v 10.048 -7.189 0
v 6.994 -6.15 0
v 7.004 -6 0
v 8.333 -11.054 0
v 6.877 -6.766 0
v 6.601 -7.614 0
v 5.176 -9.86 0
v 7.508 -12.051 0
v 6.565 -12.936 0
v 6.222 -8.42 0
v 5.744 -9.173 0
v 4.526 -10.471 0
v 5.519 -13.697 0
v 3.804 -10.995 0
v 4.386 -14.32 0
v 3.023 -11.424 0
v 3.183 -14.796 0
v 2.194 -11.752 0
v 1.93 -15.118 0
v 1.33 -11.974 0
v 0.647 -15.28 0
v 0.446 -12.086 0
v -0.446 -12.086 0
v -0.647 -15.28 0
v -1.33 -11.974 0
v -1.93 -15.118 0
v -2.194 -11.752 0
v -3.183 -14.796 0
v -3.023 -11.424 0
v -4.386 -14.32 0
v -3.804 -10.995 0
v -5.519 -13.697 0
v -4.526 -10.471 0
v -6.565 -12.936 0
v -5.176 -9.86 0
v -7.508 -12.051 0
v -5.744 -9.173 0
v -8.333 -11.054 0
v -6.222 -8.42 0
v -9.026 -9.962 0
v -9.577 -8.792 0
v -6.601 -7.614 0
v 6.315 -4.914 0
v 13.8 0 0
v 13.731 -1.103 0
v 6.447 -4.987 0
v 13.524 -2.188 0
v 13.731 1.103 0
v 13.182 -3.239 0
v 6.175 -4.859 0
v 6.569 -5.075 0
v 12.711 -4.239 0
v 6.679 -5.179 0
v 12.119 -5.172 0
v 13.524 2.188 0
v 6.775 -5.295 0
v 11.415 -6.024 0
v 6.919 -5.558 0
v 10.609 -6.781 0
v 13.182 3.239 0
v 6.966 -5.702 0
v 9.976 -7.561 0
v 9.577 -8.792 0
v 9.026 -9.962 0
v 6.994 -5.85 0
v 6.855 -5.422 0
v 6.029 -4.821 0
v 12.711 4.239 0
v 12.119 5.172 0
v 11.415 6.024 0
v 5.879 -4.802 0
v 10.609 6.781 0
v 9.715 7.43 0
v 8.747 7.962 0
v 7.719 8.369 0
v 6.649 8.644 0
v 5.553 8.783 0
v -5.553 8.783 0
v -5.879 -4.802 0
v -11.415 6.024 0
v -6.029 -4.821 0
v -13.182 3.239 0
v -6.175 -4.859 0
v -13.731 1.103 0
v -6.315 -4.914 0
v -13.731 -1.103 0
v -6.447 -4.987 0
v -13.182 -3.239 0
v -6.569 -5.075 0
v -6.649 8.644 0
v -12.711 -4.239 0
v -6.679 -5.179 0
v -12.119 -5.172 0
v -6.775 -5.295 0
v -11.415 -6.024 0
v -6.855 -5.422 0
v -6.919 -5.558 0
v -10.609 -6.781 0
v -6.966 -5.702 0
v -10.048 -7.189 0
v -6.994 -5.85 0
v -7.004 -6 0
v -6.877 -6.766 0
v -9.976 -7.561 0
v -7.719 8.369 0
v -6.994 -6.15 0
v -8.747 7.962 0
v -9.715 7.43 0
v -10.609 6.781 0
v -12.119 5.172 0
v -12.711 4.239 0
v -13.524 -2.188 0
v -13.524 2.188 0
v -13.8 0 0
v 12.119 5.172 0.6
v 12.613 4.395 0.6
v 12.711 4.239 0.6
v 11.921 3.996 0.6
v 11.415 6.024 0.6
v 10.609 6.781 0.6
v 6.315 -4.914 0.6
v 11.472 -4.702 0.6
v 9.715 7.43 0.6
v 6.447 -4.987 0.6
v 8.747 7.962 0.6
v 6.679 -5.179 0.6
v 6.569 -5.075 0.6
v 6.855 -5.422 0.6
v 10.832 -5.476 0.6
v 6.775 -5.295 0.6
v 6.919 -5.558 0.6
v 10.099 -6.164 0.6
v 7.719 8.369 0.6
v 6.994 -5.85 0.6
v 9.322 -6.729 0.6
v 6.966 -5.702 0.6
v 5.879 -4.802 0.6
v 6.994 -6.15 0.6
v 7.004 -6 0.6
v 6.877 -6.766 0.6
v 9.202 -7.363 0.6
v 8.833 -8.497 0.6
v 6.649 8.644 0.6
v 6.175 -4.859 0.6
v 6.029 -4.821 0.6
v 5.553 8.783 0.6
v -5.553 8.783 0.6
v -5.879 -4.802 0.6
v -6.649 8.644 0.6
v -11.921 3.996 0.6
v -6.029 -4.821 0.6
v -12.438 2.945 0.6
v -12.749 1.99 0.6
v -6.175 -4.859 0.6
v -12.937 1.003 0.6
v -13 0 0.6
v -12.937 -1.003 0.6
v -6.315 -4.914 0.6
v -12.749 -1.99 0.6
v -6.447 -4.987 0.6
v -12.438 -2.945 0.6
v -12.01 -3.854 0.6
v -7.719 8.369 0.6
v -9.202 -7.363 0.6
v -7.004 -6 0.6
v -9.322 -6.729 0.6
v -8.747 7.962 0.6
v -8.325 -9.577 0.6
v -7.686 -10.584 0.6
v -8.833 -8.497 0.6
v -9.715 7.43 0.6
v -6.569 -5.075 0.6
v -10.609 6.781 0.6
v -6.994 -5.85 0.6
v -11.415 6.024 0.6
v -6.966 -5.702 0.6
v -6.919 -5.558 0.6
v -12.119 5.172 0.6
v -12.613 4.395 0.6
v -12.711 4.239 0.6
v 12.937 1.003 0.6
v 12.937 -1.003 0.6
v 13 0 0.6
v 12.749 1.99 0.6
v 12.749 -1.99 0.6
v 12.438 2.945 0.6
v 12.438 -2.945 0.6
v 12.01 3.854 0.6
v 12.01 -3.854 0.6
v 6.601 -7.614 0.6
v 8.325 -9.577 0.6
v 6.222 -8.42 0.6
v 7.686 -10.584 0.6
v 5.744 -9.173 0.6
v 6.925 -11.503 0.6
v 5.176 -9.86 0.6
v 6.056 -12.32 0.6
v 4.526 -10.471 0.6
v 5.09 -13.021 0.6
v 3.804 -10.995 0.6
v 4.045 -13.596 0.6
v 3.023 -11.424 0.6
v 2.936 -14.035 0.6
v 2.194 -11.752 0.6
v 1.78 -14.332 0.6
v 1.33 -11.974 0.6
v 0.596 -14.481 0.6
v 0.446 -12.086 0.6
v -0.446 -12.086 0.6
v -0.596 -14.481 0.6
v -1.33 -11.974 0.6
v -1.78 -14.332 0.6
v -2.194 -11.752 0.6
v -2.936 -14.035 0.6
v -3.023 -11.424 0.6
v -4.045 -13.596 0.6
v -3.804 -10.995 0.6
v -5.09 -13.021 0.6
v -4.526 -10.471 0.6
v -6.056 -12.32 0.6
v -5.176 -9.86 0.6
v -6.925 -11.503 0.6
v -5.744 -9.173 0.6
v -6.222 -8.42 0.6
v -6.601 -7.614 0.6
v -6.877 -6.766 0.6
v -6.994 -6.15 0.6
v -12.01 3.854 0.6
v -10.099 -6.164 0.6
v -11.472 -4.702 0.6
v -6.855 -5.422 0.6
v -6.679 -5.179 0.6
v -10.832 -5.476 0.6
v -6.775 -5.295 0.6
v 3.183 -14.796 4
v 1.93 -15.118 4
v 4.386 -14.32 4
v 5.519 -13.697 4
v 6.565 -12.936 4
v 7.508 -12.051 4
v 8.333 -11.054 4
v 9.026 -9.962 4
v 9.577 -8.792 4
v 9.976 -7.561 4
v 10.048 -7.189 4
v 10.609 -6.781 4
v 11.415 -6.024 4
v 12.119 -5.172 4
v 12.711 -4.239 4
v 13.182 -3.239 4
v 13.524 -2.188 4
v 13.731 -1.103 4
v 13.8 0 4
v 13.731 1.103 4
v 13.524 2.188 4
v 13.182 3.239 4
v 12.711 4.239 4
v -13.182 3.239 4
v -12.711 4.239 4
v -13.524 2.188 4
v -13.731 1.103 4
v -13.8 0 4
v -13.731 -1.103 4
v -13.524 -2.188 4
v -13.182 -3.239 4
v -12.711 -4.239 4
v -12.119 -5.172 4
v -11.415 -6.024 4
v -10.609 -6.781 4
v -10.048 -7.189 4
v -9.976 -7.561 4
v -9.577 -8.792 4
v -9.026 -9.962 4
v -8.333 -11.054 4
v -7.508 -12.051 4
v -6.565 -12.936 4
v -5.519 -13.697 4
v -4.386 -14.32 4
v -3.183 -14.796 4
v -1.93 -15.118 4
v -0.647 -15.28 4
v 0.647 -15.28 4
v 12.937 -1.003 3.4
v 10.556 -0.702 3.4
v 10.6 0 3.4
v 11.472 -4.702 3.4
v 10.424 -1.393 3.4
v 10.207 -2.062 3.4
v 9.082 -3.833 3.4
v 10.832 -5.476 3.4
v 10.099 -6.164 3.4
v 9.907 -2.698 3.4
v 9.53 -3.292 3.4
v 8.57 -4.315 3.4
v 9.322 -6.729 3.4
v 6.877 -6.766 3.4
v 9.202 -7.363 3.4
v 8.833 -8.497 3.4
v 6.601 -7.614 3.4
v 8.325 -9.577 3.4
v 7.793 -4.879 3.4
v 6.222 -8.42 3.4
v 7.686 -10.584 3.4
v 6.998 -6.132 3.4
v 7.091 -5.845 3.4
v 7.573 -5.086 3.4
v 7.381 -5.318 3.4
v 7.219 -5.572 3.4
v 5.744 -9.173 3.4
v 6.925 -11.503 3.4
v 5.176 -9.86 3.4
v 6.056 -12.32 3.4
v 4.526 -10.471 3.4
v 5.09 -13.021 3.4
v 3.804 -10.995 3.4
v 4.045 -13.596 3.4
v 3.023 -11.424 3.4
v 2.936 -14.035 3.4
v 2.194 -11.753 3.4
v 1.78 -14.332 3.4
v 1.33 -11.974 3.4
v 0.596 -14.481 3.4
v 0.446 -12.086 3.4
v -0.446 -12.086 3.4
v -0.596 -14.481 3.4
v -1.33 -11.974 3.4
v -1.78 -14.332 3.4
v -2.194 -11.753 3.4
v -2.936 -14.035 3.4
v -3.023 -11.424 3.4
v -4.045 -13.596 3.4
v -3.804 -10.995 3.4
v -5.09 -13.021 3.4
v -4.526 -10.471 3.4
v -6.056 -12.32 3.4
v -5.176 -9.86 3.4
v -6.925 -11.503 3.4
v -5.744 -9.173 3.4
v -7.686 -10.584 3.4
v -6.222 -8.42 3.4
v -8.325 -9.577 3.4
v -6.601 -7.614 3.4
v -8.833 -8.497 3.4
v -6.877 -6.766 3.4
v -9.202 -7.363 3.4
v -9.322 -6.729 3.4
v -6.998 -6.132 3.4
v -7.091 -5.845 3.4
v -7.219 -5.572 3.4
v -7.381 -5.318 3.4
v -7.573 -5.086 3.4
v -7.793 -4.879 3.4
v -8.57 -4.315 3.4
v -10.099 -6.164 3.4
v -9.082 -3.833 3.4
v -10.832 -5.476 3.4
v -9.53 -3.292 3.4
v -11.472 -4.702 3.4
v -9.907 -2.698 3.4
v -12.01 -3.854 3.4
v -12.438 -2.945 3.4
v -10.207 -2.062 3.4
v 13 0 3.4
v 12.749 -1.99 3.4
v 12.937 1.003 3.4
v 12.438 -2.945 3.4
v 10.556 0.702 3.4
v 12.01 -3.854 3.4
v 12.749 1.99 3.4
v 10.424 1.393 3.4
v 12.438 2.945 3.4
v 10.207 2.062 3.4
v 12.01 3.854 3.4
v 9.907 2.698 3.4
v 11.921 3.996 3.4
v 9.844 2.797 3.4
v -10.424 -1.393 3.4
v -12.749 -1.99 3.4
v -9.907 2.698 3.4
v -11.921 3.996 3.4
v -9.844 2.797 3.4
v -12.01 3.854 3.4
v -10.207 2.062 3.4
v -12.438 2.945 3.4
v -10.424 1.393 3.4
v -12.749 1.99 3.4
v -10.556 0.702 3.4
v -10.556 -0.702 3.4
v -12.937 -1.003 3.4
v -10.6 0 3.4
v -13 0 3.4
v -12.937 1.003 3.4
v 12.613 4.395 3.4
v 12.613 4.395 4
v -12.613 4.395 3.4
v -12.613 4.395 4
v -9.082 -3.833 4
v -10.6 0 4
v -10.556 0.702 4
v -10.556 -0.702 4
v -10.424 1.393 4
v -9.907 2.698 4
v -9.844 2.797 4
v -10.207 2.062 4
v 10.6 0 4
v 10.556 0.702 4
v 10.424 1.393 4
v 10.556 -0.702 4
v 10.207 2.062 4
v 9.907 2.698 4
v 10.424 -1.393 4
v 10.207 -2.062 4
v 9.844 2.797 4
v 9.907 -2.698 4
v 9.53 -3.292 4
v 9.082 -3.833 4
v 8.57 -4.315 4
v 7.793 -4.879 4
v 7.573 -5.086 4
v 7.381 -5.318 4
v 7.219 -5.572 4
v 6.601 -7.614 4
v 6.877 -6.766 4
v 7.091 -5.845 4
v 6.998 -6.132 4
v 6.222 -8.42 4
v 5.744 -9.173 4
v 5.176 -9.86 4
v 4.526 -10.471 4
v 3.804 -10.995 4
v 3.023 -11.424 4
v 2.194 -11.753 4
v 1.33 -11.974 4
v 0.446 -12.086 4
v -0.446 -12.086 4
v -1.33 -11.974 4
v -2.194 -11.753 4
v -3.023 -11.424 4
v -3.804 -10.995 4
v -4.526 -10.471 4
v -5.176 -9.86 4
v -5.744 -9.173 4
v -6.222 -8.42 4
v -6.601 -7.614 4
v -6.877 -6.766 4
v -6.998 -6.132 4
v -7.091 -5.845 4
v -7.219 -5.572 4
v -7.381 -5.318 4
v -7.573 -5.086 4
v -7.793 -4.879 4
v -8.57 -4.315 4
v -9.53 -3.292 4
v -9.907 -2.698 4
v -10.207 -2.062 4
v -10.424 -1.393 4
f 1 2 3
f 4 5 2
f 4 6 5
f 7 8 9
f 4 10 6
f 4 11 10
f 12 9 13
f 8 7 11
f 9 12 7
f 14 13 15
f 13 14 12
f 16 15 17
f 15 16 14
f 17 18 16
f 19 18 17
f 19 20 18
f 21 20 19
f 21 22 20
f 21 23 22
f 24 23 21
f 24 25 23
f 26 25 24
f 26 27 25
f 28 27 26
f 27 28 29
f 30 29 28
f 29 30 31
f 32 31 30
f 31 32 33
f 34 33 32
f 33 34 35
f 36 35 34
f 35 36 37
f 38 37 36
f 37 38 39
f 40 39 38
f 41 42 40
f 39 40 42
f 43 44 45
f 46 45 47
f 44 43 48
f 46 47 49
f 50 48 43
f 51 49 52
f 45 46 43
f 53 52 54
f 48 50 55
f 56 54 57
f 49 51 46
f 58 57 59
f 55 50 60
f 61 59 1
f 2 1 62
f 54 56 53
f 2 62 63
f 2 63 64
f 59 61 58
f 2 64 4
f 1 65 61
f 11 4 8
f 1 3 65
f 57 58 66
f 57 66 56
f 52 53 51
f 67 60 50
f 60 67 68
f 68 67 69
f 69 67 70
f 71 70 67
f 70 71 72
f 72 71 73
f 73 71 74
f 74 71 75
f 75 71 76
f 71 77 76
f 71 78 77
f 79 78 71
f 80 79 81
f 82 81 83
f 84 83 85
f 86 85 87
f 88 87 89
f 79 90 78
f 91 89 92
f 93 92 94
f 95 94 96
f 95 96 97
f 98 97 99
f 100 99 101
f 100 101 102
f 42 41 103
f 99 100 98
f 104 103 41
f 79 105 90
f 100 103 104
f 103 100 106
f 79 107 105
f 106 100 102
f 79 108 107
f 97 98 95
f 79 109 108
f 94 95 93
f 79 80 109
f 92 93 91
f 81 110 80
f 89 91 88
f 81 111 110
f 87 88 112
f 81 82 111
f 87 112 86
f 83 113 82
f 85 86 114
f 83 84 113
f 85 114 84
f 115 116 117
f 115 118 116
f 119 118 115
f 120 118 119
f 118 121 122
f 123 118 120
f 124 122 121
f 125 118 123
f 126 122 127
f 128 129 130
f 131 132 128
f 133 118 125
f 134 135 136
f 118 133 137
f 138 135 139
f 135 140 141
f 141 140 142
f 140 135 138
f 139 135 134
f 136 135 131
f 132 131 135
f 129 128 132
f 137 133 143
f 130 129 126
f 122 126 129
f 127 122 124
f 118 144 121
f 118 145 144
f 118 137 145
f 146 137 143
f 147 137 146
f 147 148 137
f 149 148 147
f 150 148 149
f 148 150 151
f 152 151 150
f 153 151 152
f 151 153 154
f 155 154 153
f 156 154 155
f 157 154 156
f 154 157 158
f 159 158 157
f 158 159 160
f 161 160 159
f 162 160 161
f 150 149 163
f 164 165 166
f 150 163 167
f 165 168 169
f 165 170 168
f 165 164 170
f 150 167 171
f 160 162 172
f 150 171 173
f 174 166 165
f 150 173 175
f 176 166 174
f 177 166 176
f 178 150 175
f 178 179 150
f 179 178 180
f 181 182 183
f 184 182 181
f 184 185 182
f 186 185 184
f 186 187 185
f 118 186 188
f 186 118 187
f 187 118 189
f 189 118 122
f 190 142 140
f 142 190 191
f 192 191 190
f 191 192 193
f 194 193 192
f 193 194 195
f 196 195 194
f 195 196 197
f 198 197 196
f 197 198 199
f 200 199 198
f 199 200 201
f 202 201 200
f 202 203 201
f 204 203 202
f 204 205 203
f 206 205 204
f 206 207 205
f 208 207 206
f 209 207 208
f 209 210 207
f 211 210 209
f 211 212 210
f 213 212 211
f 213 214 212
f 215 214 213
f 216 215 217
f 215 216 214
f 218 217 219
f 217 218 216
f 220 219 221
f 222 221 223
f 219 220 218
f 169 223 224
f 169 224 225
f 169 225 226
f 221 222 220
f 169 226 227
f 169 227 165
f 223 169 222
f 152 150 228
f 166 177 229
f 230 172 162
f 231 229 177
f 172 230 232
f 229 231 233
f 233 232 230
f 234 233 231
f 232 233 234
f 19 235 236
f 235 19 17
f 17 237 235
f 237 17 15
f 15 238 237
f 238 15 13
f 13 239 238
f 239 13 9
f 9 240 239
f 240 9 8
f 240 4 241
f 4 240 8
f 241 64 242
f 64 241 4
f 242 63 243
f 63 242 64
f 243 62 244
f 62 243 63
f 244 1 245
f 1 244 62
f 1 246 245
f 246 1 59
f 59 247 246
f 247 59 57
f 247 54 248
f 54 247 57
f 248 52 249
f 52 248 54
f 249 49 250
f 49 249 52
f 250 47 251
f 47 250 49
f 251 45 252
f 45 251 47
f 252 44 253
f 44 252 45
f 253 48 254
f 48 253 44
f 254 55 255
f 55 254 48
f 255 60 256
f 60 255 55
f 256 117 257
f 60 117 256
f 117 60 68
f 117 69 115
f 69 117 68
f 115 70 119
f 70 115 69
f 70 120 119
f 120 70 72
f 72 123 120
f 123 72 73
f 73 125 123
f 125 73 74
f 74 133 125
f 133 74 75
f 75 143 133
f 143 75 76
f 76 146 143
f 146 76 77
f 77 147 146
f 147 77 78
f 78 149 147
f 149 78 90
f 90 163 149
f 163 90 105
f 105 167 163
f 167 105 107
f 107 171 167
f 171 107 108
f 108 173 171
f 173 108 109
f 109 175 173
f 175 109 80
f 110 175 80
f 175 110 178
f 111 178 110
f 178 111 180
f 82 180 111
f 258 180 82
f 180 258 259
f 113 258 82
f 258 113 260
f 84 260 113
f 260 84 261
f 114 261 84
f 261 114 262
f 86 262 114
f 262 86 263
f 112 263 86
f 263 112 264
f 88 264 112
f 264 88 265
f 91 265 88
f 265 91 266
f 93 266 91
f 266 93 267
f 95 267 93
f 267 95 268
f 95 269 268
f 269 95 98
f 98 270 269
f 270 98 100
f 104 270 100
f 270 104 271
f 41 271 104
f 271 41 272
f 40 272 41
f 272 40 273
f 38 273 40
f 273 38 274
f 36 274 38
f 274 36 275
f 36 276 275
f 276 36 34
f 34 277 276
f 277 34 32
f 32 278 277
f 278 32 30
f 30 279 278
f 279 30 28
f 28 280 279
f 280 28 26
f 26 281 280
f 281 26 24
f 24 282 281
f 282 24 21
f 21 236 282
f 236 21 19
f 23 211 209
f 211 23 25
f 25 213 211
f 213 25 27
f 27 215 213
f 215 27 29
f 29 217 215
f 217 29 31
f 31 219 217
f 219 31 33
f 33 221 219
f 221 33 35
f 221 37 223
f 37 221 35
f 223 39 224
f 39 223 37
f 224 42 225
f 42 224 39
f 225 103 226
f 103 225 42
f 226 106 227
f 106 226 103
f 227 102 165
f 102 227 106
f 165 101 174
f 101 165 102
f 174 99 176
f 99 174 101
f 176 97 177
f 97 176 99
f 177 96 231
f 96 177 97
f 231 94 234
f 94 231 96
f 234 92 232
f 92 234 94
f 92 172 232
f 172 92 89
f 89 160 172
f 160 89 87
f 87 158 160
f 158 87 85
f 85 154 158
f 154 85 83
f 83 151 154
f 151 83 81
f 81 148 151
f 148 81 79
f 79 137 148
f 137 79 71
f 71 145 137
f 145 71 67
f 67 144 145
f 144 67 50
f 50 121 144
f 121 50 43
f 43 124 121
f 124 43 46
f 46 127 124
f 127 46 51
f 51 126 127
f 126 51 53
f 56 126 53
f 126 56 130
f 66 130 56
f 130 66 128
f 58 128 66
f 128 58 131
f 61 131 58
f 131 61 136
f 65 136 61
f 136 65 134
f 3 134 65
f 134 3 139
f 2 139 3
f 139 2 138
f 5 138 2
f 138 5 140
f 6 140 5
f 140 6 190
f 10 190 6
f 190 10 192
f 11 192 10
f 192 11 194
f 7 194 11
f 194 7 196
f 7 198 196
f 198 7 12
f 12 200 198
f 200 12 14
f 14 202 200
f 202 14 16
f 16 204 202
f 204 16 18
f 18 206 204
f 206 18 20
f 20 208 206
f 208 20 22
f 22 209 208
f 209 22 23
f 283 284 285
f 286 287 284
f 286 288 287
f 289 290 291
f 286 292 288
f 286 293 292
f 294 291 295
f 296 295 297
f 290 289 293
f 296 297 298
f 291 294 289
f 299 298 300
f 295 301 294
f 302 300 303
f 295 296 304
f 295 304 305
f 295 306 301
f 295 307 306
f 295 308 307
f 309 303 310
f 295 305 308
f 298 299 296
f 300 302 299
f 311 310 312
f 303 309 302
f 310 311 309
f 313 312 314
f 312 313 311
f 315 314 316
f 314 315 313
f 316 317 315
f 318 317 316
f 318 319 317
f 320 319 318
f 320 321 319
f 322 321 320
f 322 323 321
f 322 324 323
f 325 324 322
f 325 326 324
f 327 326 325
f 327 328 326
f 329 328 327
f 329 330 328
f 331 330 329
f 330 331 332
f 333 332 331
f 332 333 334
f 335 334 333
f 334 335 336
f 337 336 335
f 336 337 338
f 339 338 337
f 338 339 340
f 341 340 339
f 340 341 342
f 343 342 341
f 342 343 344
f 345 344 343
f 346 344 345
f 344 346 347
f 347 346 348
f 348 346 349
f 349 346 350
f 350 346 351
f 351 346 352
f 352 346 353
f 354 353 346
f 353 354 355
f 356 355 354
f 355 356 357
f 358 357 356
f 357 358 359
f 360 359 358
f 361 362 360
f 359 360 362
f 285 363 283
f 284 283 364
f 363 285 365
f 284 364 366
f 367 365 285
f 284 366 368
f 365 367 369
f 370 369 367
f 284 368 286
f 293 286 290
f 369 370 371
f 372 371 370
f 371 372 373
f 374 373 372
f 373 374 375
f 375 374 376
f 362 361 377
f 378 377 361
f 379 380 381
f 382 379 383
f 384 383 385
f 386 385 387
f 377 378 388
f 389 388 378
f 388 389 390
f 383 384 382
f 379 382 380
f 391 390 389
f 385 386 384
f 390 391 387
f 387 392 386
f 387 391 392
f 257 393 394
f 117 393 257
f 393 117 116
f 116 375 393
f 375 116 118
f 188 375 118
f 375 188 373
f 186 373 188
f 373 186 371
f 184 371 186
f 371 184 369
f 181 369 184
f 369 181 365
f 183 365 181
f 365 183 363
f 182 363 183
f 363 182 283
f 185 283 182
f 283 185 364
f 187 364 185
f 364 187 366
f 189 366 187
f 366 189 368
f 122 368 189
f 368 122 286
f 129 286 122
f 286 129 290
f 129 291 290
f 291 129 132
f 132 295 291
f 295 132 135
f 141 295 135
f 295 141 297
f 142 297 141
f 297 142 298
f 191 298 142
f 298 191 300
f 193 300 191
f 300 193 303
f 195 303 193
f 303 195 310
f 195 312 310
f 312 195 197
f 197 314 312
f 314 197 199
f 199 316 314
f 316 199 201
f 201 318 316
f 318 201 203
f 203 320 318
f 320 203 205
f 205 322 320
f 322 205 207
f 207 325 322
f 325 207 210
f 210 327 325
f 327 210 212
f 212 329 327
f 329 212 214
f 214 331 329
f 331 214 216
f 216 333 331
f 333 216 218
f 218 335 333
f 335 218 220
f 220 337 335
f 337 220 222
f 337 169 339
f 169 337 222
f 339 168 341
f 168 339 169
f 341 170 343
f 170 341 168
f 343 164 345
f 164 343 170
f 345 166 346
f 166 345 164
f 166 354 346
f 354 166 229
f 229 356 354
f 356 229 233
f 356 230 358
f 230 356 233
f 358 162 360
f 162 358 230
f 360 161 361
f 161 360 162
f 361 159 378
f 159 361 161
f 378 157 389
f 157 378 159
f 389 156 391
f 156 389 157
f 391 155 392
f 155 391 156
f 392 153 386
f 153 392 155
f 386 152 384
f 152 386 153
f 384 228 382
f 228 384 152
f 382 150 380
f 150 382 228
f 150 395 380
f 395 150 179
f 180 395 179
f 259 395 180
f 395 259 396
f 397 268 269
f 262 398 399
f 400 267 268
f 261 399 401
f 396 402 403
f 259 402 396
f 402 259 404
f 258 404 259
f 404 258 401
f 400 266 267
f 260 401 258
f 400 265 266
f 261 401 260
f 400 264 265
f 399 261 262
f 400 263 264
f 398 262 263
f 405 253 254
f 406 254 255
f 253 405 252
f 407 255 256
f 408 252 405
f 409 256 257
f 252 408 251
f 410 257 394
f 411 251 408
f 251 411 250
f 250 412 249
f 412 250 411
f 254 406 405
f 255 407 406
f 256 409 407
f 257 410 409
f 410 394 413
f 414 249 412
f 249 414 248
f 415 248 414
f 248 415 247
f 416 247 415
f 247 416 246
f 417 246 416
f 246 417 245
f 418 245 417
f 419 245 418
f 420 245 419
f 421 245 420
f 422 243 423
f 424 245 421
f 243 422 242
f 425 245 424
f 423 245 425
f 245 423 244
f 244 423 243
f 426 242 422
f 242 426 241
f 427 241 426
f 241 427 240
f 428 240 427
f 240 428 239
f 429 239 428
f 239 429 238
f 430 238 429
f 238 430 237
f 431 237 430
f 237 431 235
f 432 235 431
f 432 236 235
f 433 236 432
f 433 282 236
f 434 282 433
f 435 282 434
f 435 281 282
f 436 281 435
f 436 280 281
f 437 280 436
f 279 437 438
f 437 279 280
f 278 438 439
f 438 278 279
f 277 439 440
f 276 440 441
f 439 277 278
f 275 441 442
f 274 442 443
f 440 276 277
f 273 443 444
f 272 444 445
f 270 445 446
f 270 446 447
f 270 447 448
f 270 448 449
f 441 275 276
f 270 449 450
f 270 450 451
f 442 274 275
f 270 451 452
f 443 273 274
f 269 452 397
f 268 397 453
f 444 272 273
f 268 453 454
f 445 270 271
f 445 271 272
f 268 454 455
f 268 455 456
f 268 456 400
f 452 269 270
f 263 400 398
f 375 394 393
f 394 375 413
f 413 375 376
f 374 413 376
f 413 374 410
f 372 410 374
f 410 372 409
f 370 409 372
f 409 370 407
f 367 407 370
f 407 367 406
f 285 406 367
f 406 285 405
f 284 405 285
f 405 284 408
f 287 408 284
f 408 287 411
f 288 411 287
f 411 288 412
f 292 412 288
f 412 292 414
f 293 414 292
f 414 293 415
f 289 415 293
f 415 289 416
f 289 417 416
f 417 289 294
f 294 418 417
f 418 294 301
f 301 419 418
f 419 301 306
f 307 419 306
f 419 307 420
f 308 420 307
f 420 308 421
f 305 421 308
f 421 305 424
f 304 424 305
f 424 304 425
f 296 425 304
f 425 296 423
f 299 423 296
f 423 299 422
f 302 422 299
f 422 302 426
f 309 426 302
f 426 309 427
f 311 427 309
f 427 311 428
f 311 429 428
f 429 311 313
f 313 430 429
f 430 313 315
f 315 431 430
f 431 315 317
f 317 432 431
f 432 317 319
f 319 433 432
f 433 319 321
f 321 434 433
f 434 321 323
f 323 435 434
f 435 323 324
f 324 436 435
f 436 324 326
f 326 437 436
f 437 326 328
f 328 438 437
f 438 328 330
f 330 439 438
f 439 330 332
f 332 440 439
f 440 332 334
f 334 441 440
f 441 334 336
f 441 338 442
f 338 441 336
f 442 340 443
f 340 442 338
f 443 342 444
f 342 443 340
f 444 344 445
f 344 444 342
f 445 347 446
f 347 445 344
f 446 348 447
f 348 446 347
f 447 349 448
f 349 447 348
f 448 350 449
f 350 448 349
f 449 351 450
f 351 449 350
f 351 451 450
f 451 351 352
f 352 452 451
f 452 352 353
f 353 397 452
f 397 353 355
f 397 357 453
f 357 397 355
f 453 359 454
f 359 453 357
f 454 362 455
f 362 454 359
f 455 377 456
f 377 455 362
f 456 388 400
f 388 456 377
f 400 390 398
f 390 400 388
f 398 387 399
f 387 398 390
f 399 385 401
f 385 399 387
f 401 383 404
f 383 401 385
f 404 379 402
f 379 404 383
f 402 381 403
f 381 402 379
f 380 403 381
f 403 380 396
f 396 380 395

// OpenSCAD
// file: ../lib/subtract.scad
// module subtr_2d(radius) {
//     render() difference() {
//         children();
//         minkowski() {
//             difference() {
//                 minkowski() {
//                     children();
//                     square(1, center = true);
//                 }
//                 children();
//             }
//             circle(radius);
//         }
//     }
// }

module subtr_2d(radius, bbox = 1000) {
    render() difference() {
        children();
        minkowski() {
            difference() {
                square(bbox, center = true);
                children();
            }
            circle(radius);
        }
    }
}

module subtr_3d(radius, bbox = 1000) {
    render() difference() {
        children();
        minkowski() {
            difference() {
                cube(bbox, center = true);
                children();
            }
            sphere(radius);
        }
    }
}
// main file
include <../lib/subtract.scad>
$fn = 50;

inset = 2.4;
r_mid = 19 / 2;
r_hole = r_mid - inset;
r_side = 16 / 2;
width = 26;
mid_shift = 5;
cutoff_inner = 4.5;
cutoff_angle = 30;
cutoff_hole = -6;
roundness = 1.2;

shell = 0.8;
height_inner = 2.8;
height_outer = 0.6;

module cutoff_square(cutoff) {
    translate([ -100, cutoff ]) square([ 200, 100 ]);
}

module radial_cutoff_half() {
    intersection() {
        translate([ width / 2 - r_side, 0 ]) rotate(cutoff_angle) cutoff_square(0);
        rotate(-90) cutoff_square(0);
    }
}

module radial_cutoff() {
    radial_cutoff_half();
    mirror([ 1, 0 ]) radial_cutoff_half();
}

module key() {
    translate([ 0, -mid_shift ]) circle(r_mid);
    hull() {
        translate([ width / 2 - r_side, 0 ]) circle(r_side);
        translate([ -(width / 2 - r_side), 0 ]) circle(r_side);
    }
}

module expanded() {
    minkowski() {
        key();
        circle(shell);
    }
}

module lower() {
    difference() {
        expanded();
        minkowski() {
            difference() {
                translate([ 0, -mid_shift ]) circle(r_hole - roundness);
                cutoff_square(cutoff_hole);
            }
            circle(roundness);
        }
    }
}

module inner() {
    difference() {
        expanded();
        key();
        radial_cutoff();
    }
}

module upper() {
    difference() {
        expanded();
        subtr_2d(inset) key();
        radial_cutoff();
    }
}

translate([ 0, 0, 0 ]) linear_extrude(height_outer) lower();
translate([ 0, 0, height_outer ]) linear_extrude(height_inner) inner();
translate([ 0, 0, height_outer + height_inner ]) linear_extrude(height_outer) upper();
